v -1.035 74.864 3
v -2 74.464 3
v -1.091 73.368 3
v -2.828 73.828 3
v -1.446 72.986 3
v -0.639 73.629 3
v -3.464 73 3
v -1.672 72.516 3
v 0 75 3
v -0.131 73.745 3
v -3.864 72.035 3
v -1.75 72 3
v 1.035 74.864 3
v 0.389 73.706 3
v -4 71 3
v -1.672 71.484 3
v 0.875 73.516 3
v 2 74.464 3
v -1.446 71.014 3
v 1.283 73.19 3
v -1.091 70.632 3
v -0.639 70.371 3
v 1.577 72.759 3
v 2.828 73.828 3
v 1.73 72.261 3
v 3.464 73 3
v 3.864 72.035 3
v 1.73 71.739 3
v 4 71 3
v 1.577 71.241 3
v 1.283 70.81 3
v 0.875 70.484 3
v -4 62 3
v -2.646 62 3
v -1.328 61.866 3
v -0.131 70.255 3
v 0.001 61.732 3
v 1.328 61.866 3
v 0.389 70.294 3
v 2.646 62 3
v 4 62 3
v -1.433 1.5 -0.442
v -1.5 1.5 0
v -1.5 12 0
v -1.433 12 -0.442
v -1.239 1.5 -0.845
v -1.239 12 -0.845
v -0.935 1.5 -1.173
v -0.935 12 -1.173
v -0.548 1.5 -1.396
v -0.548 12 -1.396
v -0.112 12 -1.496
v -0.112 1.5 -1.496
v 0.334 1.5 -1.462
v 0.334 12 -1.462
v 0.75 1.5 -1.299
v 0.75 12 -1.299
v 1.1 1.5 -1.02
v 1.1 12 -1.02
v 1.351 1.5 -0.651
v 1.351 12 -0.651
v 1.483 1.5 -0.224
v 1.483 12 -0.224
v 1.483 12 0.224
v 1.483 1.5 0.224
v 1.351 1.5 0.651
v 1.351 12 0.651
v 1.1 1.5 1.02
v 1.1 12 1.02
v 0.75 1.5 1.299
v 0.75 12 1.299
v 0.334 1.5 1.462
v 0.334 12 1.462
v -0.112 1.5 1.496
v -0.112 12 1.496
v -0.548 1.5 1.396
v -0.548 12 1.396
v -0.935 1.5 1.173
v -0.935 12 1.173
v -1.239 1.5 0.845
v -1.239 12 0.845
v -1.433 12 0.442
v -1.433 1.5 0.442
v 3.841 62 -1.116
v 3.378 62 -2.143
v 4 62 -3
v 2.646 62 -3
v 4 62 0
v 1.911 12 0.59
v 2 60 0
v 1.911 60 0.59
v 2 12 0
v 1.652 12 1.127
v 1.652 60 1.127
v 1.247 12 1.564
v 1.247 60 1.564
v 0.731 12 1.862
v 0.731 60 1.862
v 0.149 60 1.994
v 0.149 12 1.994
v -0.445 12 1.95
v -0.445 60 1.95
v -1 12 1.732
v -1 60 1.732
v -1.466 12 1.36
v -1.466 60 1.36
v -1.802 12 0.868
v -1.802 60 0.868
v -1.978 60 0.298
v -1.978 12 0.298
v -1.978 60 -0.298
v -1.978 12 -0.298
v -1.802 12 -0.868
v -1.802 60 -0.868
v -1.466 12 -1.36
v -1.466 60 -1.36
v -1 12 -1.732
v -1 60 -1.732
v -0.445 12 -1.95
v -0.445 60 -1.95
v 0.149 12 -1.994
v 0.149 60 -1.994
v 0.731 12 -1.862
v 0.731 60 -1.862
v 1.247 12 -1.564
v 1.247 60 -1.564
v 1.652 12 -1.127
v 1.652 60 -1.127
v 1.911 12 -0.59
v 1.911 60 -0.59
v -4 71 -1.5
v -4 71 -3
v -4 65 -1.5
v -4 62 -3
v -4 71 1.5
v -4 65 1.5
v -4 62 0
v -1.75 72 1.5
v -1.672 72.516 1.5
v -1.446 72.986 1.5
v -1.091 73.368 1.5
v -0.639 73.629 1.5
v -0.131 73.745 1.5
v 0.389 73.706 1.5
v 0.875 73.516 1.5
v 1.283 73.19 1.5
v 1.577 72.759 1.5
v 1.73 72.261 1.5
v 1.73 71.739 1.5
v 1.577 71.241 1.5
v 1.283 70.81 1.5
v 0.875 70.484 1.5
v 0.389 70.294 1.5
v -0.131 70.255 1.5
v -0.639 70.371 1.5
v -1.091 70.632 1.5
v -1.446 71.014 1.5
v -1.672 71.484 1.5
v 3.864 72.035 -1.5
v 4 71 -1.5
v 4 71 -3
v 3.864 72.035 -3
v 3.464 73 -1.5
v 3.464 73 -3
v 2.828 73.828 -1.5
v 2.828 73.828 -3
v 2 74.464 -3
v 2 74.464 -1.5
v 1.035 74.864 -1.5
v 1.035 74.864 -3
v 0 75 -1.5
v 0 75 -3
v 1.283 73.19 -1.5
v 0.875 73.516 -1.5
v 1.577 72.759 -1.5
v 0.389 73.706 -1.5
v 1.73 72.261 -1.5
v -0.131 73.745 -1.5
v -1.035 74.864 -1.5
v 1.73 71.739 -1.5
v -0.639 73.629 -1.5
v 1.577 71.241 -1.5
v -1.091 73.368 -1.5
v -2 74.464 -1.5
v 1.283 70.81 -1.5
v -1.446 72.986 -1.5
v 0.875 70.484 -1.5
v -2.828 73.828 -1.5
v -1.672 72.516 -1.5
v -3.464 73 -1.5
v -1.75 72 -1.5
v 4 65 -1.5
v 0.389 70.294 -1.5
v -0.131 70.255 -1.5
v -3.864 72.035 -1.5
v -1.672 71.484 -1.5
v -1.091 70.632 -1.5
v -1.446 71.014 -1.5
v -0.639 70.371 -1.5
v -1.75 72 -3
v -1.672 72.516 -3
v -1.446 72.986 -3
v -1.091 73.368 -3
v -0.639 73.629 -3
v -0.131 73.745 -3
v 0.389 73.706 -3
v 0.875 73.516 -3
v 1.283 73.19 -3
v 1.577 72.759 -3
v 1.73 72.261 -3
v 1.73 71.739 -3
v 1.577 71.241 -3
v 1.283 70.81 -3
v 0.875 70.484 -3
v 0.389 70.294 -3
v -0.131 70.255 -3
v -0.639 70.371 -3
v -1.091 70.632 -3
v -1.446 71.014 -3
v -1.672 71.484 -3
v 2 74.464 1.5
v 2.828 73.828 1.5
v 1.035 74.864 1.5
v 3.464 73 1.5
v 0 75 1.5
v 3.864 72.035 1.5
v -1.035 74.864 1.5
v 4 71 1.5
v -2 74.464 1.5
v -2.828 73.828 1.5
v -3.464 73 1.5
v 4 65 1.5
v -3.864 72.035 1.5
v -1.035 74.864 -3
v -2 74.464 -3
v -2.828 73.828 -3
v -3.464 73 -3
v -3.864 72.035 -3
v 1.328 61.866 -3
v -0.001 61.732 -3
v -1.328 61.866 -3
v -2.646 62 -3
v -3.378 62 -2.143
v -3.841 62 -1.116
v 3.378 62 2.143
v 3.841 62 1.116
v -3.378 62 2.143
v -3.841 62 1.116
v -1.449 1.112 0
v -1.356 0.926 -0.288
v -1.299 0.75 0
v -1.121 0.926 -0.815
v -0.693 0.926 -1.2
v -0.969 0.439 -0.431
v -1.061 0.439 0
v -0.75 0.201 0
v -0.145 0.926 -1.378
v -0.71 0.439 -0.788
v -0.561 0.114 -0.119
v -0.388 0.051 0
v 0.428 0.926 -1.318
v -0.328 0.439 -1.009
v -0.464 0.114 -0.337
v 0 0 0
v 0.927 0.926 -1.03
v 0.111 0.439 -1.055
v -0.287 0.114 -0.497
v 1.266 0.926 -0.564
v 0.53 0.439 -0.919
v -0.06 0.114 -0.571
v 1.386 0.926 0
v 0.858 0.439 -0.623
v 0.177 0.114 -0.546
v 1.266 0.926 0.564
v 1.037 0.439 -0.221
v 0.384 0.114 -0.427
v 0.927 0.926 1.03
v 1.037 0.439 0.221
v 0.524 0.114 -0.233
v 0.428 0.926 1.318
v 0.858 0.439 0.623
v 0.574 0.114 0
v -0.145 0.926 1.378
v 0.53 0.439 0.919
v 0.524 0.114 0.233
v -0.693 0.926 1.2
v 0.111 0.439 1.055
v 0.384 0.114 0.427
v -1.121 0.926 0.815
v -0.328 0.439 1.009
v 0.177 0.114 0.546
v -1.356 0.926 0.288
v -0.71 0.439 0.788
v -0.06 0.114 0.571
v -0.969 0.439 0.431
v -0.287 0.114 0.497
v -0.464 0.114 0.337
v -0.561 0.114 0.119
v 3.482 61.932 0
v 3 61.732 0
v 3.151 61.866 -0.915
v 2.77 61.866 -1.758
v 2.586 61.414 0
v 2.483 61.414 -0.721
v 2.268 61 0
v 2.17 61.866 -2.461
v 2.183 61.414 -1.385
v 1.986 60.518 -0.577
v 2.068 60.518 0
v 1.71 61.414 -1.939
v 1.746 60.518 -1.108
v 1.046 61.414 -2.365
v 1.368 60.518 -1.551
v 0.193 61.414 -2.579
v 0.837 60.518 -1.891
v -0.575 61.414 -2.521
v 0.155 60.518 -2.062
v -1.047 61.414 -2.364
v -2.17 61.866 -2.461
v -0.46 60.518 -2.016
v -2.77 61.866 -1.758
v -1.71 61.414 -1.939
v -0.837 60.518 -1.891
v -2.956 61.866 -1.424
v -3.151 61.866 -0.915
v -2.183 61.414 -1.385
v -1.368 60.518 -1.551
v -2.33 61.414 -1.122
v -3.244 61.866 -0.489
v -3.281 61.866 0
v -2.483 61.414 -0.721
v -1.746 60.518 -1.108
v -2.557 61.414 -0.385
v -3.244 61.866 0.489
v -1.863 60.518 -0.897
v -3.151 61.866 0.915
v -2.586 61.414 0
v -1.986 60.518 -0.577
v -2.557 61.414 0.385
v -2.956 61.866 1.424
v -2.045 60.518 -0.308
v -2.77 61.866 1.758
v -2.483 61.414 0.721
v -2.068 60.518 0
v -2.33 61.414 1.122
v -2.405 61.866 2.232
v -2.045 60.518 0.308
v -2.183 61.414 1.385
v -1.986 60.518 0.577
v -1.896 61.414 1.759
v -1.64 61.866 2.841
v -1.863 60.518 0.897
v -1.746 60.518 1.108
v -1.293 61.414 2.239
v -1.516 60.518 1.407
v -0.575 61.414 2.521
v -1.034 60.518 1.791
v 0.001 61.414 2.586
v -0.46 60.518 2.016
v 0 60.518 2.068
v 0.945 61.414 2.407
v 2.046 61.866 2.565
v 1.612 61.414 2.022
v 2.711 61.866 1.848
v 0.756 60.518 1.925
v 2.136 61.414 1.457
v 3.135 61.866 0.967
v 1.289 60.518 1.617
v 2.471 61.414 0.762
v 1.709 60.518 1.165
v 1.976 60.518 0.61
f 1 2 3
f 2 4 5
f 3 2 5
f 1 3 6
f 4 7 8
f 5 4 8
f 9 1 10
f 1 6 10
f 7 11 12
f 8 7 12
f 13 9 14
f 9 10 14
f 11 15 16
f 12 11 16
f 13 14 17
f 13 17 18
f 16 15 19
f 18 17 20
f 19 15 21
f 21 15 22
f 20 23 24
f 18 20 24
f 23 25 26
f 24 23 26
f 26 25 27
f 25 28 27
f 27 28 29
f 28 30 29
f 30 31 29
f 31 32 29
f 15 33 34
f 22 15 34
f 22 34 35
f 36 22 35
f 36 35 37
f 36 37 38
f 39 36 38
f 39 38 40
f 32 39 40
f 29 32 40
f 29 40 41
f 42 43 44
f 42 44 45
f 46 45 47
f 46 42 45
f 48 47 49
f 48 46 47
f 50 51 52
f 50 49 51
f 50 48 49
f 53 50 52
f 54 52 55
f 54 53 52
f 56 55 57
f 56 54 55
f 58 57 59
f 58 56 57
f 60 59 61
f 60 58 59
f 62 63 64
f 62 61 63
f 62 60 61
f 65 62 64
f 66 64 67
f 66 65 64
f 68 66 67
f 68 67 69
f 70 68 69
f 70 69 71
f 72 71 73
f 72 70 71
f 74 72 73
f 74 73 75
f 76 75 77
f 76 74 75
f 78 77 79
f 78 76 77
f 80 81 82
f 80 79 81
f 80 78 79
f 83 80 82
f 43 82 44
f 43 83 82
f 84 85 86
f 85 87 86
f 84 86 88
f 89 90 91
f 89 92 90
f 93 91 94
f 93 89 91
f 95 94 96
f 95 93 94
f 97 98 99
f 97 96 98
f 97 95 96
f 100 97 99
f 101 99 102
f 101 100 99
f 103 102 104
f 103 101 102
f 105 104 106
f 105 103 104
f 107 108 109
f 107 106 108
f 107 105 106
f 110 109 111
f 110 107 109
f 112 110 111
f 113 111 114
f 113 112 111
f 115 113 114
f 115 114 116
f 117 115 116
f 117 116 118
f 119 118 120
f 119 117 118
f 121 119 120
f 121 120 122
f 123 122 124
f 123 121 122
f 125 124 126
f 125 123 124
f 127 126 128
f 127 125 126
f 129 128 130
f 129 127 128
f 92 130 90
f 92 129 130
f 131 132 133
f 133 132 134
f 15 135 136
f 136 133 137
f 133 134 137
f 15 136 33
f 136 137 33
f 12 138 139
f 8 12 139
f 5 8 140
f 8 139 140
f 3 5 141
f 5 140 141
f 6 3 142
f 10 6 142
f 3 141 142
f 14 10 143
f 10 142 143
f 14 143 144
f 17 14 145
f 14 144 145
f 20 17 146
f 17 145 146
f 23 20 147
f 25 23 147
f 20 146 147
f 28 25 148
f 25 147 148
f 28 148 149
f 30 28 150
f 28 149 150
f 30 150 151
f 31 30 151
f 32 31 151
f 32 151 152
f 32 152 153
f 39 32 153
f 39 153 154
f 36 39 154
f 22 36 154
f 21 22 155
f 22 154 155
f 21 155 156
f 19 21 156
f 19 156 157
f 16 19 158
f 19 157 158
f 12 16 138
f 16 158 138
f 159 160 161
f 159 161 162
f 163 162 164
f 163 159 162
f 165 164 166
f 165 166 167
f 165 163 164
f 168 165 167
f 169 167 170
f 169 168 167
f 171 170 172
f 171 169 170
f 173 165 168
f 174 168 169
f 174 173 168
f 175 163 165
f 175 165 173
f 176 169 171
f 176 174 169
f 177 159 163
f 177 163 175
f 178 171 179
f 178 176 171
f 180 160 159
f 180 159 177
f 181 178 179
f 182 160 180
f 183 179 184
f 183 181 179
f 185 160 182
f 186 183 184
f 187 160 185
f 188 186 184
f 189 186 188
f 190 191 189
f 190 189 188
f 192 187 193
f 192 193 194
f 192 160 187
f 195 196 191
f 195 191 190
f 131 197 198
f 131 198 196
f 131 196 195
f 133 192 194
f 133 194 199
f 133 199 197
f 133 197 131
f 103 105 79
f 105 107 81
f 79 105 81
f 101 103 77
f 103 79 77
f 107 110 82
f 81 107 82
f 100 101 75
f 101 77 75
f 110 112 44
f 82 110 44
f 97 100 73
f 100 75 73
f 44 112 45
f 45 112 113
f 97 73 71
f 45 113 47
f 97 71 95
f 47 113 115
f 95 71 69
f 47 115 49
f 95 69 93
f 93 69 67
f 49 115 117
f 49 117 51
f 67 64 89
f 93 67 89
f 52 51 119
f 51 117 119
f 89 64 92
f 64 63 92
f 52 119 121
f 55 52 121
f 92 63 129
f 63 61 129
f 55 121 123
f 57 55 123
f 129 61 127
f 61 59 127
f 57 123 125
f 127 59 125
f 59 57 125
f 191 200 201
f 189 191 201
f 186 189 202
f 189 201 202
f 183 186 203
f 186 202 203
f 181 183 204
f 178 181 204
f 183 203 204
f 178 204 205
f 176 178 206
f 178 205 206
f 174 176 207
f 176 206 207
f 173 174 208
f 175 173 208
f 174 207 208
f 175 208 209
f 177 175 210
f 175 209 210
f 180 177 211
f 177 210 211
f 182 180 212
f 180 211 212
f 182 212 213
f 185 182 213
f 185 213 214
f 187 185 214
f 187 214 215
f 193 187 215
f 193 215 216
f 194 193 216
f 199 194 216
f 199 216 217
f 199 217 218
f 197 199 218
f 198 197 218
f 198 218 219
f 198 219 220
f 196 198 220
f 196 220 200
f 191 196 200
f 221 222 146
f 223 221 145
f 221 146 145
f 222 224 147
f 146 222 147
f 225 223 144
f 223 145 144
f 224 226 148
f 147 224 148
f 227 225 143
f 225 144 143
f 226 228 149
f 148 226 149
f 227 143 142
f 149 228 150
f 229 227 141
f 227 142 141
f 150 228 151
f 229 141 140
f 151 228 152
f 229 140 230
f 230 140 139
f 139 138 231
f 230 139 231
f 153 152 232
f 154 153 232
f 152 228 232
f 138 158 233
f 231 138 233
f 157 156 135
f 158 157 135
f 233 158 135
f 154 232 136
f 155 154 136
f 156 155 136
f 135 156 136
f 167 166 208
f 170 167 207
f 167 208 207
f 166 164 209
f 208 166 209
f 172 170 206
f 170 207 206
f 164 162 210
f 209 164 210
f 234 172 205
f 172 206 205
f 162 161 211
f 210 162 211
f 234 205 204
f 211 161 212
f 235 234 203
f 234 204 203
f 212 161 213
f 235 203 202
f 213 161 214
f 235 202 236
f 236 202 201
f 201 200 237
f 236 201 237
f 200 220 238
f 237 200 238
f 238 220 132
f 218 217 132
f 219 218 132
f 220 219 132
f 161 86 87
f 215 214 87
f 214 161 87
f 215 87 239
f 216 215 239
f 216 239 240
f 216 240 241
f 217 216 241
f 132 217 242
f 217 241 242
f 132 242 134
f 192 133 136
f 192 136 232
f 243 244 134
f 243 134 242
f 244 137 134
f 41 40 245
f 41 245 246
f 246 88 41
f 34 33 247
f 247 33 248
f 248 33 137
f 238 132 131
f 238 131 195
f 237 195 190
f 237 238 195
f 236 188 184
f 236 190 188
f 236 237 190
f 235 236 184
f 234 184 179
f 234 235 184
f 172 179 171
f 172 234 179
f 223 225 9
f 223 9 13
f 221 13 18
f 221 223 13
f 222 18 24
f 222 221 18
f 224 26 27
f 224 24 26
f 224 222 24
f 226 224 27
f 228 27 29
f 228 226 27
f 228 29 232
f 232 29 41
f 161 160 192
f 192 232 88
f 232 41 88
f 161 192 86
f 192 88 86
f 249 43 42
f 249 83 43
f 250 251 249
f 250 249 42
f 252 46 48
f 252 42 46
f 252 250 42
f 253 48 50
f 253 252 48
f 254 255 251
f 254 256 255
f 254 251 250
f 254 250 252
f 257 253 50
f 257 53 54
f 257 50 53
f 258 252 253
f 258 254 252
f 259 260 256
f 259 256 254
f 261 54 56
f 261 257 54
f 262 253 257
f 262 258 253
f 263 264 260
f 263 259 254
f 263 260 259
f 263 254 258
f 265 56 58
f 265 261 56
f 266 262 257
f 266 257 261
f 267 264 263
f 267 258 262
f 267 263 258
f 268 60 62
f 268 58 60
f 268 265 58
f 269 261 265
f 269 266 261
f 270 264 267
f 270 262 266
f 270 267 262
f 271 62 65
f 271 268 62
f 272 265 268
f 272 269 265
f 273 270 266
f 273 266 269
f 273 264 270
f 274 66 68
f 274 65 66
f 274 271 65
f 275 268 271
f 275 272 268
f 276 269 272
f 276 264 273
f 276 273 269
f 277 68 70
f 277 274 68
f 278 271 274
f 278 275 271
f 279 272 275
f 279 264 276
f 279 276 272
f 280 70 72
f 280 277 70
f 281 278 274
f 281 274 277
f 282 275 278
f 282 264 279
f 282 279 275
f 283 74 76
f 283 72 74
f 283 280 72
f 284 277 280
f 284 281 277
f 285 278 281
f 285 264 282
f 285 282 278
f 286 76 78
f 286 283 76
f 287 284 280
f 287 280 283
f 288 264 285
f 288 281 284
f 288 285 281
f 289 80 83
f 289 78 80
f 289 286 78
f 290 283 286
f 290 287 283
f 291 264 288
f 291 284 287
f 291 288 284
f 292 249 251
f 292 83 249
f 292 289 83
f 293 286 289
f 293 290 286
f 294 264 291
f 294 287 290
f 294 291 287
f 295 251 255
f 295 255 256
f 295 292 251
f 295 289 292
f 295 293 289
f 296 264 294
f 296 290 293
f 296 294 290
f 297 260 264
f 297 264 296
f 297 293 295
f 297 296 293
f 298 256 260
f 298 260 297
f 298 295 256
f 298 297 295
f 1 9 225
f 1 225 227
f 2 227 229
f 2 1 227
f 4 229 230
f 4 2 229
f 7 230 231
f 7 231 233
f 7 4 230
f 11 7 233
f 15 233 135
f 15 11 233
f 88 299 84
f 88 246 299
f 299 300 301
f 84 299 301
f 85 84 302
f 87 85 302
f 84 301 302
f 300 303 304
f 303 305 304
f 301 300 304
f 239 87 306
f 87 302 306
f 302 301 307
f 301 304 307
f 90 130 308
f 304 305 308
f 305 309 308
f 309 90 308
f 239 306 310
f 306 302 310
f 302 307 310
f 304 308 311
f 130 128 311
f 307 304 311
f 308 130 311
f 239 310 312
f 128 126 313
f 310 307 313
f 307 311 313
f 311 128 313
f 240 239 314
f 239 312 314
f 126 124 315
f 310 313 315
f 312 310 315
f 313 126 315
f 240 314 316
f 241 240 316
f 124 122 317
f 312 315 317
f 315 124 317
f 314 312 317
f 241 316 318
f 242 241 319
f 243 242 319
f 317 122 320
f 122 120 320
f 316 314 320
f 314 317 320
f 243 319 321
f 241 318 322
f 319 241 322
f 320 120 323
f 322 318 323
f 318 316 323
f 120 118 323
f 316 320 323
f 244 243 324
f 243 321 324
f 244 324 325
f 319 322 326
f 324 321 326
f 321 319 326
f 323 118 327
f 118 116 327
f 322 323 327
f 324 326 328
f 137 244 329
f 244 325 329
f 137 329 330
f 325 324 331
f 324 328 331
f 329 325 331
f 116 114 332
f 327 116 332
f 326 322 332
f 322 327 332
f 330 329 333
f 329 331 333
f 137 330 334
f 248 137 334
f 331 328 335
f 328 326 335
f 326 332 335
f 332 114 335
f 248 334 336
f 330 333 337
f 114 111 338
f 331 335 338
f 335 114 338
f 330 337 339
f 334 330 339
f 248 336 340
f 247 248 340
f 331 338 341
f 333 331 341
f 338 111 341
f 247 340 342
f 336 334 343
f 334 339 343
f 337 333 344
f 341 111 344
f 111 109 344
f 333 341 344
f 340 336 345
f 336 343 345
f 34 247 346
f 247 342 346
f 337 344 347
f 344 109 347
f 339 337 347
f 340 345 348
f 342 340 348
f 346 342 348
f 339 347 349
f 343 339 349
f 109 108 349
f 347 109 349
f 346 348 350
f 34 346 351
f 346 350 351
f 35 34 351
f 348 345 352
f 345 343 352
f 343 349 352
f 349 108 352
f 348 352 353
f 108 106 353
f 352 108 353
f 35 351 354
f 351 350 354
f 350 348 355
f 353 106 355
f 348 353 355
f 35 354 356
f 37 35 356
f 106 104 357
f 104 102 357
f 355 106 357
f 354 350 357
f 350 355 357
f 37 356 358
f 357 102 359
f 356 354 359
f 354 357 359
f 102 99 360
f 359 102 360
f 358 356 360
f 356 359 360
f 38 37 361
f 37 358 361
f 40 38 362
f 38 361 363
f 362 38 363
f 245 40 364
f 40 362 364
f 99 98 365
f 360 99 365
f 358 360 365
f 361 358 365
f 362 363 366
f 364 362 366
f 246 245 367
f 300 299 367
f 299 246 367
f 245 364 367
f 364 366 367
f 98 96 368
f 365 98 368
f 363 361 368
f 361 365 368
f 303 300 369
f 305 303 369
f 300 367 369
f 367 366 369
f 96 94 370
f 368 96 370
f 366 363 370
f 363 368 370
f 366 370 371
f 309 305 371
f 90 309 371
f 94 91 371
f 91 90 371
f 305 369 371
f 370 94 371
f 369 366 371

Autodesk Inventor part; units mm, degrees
ref_plane "YZ Plane" through (0, 0, 0) normal (1, 0, 0) x (0, 1, 0)
ref_plane "XZ Plane" through (0, 0, 0) normal (0, 1, 0) x (-1, 0, 0)
ref_plane "XY Plane" through (0, 0, 0) normal (0, 0, 1) x (1, 0, 0)
sketch "Sketch1" plane through (0, 0, 0) normal (0, 1, 0) x (-1, 0, 0)
  circle A0 centre (0, 0) radius 1.5
  dimension "d0" = 3
extrude "Extrusion1" add sketch "Sketch1" along normal blind 12
sketch "Sketch2" plane through (0, 12, 0) normal (0, 1, 0) x (1, 0, 0)
  circle A0 centre (0, 0) radius 2
  dimension "d3" = 4
extrude "Extrusion2" add sketch "Sketch2" along normal blind 50
thread "Thread1" size "M4x0.7" class "6g" standard "ANSI Metric M Profile" length 20.5 offset 30
fillet "Fillet1" radius 1.5 1 edges at (1.5, 0, 0)
sketch "Sketch6" plane through (0, 62, 0) normal (0, 1, 0) x (1, 0, 0)
  line L0 (4, 3) -> (-4, 3)
  line L1 (-4, 3) -> (-4, -3)
  line L2 (-4, -3) -> (4, -3)
  line L3 (4, -3) -> (4, 3)
  line L4 (4, 3) -> (-4, -3) construction
  line L5 (-4, 3) -> (4, -3) construction
  point P0 (0, 0)
  point P1 (0, 0)
  dimension "d49" = 8
  dimension "d50" = 6
  dimension "d51" = 4
  dimension "d52" = 3
  dimension "d53" = 4
  dimension "d54" = 3
extrude "Extrusion6" add sketch "Sketch6" along normal blind 3
sketch "Sketch7" plane through (0, 65, 0) normal (0, 1, 0) x (1, 0, 0)
  line L0 (-4, -3) -> (4, -3)
  line L1 (4, -3) -> (4, -1.5)
  line L2 (4, -1.5) -> (-4, -1.5)
  line L3 (-4, -1.5) -> (-4, -3)
  line L4 (4, 3) -> (-4, 3)
  line L5 (-4, 3) -> (4, 3)
  line L6 (4, 3) -> (4, 1.5)
  line L7 (4, 1.5) -> (-4, 1.5)
  line L8 (-4, 1.5) -> (-4, 3)
  point P0 (0, 0)
  point P1 (0, 0)
  dimension "d57" = 1.5
  dimension "d58" = 1.5
  dimension "d59" = 4.5
  dimension "d60" = 8
  dimension "d61" = 8
  dimension "d62" = 3
  dimension "d63" = 4
  dimension "d64" = 0
  dimension "d65" = 4
  dimension "d66" = 3
extrude "Extrusion7" add sketch "Sketch7" along normal blind 10
sketch "Sketch8" plane through (4, 62, -3) normal (0, 0, -1) x (-1, 0, 0)
  line L0 (8, 0) -> (0, 0)
  circle A0 centre (4, 10) radius 1.75
  point P0 (4, -62)
  point P1 (4, -62)
  dimension "d69" = 3.5
  dimension "d70" = 62
  dimension "d71" = 10
  dimension "d72" = 62
  dimension "d73" = 62.1289
  dimension "d74" = 72
  dimension "d75" = 0
  dimension "d76" = 62.1289
extrude "Extrusion8" cut sketch "Sketch8" against normal through all
fillet "Fillet5" radius 4 4 edges at (-4, 75, -2.25) (-4, 75, 2.25) (4, 75, -2.25) (4, 75, 2.25)
fillet "Fillet6" radius 2 1 edges at (-2, 62, 0)
properties part number "reverse gear steam chest rod valve 1"
